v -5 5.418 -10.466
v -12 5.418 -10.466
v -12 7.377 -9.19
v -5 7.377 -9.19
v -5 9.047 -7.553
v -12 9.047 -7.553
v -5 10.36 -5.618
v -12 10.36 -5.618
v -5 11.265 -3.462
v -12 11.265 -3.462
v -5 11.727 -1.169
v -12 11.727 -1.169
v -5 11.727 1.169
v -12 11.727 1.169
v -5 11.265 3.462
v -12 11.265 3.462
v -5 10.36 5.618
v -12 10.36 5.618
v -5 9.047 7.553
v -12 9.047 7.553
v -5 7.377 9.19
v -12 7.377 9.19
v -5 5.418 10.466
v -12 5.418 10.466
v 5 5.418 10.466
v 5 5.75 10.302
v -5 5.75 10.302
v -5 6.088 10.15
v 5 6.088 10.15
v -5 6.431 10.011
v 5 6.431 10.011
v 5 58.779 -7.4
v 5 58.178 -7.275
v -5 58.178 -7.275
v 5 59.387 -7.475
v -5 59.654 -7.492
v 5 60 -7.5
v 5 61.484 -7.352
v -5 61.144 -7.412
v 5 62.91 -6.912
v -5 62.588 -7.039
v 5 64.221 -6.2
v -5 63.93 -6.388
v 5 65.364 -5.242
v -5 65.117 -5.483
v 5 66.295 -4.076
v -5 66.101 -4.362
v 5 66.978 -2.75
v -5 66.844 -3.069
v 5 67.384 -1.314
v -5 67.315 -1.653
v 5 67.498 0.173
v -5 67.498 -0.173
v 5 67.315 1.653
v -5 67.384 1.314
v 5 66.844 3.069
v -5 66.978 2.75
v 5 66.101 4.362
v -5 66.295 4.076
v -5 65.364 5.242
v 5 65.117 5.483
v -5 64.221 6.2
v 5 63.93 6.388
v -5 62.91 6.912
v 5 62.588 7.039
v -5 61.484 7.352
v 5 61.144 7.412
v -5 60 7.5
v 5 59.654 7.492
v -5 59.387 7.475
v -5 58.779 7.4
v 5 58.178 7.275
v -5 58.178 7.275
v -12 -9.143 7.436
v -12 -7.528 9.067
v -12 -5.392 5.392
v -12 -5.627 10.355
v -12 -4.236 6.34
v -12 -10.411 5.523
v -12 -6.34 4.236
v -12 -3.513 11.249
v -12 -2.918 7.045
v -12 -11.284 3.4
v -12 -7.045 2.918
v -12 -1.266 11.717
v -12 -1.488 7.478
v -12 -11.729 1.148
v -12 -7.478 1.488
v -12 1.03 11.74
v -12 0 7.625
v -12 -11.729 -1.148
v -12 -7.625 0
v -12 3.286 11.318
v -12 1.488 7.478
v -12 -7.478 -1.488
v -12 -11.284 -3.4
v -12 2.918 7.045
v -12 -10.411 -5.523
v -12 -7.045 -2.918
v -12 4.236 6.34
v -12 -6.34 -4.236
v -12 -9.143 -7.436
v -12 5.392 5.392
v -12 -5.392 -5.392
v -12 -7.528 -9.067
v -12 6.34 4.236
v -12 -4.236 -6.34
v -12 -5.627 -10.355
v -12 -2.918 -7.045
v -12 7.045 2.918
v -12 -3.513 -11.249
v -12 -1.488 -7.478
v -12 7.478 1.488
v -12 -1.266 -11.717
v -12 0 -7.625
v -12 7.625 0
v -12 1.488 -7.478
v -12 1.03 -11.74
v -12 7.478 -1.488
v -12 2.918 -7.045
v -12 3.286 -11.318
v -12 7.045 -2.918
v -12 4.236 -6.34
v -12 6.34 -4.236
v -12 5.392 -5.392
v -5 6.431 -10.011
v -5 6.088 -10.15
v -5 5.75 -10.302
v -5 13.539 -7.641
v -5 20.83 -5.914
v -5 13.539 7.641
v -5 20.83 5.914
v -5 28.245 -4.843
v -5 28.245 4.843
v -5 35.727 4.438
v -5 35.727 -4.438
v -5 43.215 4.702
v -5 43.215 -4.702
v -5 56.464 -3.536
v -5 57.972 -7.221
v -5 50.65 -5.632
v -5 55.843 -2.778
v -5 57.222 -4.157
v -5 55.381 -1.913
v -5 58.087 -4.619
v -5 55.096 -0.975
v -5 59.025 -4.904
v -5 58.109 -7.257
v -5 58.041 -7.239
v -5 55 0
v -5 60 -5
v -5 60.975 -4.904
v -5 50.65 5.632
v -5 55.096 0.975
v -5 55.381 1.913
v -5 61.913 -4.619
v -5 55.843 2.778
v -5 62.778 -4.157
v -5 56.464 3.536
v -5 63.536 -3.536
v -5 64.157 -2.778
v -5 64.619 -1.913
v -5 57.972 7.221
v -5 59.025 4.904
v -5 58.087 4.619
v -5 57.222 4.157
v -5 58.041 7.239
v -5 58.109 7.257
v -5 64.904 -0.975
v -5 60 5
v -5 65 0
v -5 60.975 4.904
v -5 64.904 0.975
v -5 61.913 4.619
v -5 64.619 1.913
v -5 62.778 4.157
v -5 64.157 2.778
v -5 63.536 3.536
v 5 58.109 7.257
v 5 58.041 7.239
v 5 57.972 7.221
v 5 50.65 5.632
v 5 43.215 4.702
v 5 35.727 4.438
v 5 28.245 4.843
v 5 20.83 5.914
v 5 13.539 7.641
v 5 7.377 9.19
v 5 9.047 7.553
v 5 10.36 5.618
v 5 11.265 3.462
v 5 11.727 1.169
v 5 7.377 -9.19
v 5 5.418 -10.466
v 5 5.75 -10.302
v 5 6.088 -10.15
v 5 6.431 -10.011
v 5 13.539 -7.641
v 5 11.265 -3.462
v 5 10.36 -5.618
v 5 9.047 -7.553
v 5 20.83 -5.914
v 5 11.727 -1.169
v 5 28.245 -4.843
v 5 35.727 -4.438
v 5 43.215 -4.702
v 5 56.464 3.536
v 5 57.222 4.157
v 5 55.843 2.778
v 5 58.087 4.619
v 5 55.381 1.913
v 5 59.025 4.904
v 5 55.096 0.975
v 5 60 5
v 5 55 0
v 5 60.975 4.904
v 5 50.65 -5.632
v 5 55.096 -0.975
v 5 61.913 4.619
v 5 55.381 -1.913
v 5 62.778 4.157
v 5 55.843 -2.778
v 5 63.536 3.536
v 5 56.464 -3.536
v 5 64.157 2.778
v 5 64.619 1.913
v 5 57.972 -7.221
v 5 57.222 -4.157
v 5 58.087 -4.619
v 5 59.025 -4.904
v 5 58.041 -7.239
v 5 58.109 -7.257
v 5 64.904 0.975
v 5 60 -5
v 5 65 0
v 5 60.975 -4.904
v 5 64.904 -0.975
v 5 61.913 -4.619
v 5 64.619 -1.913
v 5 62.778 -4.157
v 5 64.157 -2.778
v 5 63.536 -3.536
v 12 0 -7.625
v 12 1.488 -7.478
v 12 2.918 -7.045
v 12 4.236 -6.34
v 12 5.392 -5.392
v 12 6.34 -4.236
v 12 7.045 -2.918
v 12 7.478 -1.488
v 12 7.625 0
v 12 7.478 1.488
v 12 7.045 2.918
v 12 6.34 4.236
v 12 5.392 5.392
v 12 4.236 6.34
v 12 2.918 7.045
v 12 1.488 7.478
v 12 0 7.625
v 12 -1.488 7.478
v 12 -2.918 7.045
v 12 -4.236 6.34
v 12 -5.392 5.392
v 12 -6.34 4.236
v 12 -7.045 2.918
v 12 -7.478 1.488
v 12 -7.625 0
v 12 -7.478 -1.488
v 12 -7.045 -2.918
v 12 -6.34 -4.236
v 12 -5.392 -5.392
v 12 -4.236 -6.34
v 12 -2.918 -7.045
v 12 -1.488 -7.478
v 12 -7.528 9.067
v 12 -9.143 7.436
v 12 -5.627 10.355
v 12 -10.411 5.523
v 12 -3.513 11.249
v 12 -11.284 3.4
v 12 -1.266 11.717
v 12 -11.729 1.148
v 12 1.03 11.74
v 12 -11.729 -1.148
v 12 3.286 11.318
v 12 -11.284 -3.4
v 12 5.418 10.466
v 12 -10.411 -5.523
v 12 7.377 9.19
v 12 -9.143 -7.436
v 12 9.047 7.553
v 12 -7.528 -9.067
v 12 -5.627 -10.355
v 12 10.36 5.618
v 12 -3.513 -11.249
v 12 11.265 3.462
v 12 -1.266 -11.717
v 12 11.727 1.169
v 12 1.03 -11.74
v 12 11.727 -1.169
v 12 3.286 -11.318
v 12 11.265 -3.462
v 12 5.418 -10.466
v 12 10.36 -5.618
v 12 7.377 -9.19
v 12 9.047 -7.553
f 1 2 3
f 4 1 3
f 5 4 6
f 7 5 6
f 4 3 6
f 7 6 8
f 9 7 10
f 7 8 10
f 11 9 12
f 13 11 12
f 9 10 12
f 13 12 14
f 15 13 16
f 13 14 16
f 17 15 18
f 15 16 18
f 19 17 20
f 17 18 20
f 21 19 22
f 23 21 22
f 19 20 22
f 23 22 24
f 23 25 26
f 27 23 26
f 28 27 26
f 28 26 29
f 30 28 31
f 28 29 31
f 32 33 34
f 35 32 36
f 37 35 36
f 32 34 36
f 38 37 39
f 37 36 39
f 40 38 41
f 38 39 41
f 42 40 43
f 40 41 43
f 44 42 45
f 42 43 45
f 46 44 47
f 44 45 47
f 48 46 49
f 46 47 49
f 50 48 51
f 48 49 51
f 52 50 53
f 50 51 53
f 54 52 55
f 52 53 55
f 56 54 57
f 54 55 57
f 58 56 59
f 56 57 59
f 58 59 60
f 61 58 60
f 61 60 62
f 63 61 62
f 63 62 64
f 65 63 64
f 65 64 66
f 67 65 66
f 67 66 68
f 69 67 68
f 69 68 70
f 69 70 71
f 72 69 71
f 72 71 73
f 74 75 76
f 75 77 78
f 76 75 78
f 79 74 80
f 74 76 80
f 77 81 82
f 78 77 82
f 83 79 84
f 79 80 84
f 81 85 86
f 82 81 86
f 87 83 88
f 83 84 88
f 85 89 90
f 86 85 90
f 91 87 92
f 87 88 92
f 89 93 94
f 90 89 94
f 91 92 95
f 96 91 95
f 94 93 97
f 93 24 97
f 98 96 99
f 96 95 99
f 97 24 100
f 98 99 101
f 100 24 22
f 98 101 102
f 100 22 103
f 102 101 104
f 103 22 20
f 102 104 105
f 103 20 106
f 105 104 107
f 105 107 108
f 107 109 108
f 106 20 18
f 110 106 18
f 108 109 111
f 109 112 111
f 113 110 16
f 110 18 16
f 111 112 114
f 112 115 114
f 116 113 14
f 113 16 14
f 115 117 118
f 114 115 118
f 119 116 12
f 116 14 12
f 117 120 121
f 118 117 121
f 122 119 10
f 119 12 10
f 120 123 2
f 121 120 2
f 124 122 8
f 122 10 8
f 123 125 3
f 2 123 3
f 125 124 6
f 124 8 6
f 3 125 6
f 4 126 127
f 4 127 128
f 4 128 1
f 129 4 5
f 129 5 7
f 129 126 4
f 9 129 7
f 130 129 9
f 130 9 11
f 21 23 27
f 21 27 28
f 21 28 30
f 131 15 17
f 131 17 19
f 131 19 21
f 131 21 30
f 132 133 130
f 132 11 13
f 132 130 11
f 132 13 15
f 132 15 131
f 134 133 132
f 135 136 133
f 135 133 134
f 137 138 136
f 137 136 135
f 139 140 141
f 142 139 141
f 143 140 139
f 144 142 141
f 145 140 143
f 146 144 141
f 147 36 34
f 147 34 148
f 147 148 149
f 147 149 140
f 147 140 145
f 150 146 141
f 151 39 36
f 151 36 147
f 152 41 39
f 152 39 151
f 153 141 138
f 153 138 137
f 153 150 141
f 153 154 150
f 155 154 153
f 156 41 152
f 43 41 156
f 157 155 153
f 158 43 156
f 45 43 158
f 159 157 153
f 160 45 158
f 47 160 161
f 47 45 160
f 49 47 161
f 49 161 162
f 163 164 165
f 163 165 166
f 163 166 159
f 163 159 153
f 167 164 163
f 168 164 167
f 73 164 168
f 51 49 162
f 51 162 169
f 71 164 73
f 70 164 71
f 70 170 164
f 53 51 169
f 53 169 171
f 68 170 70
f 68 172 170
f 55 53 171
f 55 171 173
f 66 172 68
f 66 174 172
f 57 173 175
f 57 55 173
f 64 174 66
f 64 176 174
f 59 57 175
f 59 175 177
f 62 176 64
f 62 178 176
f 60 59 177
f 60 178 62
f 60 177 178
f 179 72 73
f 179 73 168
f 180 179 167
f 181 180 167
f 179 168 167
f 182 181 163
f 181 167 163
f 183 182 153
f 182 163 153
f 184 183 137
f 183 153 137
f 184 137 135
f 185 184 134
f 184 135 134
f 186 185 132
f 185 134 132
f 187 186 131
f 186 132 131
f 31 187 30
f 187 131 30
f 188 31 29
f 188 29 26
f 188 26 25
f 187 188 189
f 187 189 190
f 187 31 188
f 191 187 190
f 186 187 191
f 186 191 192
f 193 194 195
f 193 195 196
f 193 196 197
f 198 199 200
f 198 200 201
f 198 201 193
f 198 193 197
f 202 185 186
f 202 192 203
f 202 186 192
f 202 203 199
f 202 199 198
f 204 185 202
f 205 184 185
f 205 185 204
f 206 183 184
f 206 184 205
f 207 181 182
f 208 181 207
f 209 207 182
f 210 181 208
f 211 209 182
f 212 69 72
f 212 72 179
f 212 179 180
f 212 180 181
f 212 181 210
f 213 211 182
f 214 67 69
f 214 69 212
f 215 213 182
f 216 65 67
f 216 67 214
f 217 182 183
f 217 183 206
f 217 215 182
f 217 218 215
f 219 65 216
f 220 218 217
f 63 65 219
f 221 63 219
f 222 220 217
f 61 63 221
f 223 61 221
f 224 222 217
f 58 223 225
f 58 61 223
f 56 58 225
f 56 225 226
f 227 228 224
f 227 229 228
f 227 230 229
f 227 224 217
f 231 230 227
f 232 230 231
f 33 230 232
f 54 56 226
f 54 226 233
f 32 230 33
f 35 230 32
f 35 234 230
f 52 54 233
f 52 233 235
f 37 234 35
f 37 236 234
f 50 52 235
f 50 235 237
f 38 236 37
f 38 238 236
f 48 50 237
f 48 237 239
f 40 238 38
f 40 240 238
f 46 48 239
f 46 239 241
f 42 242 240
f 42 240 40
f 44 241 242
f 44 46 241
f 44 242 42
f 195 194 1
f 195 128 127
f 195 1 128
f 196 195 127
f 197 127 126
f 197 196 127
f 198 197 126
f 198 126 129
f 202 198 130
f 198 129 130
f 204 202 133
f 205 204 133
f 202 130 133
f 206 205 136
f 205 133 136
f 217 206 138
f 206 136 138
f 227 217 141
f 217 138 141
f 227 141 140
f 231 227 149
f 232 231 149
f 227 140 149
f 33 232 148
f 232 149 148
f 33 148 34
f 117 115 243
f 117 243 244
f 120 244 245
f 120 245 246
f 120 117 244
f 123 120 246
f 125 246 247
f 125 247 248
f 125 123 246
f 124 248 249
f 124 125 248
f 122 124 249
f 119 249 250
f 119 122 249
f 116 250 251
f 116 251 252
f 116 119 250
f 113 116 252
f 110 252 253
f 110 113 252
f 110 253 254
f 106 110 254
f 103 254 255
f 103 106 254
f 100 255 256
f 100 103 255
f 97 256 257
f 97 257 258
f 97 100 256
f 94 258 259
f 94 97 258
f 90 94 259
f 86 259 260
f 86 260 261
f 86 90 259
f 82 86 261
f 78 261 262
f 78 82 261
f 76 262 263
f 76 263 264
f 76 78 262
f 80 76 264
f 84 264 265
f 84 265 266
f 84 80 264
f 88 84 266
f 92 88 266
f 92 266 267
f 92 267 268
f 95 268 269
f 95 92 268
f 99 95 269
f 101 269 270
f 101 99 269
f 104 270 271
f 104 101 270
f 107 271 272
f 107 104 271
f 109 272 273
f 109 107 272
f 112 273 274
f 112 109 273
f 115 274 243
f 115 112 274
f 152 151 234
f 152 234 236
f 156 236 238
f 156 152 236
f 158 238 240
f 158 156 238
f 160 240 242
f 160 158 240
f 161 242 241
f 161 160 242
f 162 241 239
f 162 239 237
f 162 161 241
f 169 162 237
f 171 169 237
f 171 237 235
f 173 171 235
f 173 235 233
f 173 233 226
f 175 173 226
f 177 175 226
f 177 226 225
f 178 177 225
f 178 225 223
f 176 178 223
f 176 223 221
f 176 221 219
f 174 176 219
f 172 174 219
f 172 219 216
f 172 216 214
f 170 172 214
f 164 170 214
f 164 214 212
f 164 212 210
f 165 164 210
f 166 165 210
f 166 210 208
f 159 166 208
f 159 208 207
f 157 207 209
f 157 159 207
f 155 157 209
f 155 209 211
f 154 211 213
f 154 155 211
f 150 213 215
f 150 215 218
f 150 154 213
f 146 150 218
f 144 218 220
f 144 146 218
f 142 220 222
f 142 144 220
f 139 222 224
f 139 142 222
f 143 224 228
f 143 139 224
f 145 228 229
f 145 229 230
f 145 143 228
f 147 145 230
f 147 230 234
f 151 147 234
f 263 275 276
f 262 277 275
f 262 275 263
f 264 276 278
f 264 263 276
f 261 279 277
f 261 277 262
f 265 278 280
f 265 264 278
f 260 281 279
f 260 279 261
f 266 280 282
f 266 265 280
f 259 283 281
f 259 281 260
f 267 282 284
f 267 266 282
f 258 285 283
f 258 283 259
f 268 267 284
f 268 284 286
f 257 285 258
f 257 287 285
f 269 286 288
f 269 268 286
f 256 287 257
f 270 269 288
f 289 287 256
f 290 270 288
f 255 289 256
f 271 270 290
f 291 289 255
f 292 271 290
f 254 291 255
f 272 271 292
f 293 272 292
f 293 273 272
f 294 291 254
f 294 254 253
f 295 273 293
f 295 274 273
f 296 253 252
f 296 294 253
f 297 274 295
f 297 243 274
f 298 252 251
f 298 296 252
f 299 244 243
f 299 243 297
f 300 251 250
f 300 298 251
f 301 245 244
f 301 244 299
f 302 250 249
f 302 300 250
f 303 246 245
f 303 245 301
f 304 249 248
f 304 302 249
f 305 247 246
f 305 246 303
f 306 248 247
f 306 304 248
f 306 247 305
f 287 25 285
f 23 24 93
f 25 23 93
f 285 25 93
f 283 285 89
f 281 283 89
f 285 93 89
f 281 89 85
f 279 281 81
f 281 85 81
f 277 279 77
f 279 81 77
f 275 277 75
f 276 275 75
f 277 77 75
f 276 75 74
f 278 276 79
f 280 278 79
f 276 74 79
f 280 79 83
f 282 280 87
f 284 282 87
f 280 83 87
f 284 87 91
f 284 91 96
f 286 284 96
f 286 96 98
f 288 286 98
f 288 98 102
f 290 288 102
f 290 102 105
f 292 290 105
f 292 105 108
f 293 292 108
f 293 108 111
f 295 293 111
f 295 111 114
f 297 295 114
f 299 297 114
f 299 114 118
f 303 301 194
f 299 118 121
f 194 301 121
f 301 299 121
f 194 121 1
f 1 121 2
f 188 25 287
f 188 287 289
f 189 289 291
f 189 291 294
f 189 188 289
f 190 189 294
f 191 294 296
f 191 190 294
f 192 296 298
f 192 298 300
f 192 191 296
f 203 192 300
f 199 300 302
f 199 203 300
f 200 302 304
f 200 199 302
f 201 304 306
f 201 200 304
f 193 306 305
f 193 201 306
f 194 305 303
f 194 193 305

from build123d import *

# Parameters (mm, degrees)
BOSS_EXTRUDE2_DEPTH      = 12
BOSS_EXTRUDE2_DEPTH_BACK = 12
SKETCH1_R                = 7.625
SKETCH1_R_2              = 5
FILLET1_R                = 10
CUT_EXTRUDE1_START       = -7
SKETCH2_R                = 5
CUT_EXTRUDE1_DEPTH       = 7
SKETCH3_R                = 5
CUT_EXTRUDE2_DEPTH       = 7


with BuildPart() as part:
    # Sketch1 → Boss-Extrude2 (new, two sides: drawn at the far end of the back side and taken through both)
    with BuildSketch(Plane(origin=(0, 0, 0), x_dir=(0, 0, -1), z_dir=(1, 0, 0)).offset(-BOSS_EXTRUDE2_DEPTH_BACK)):
        with BuildLine():
            ThreePointArc((10.249331942, 5.817161927), (4.569540082, 31.759611334), (7.275406493, 58.178335825))
            ThreePointArc((7.275406493, 58.178335825), (0, 67.5), (-7.275406493, 58.178335825))
            ThreePointArc((-7.275406493, 58.178335825), (-4.569540082, 31.759611334), (-10.249331942, 5.817161927))
            ThreePointArc((-10.249331942, 5.817161927), (0, -11.785082866), (10.249331942, 5.817161927))
        make_face()
        Circle(SKETCH1_R, mode=Mode.SUBTRACT)
        with Locations((0, 60)):
            Circle(SKETCH1_R_2, mode=Mode.SUBTRACT)
    extrude(amount=BOSS_EXTRUDE2_DEPTH + BOSS_EXTRUDE2_DEPTH_BACK)

    # Fillet1
    fillet1_edges = [part.edges().sort_by_distance(p)[0] for p in [
        (0, 5.817161927, -10.249331942),
        (0, 5.817161927, 10.249331942),
    ]]
    fillet(fillet1_edges, radius=FILLET1_R)

    # Sketch2 → Cut-Extrude1 (cut)
    with BuildSketch(Plane(origin=(12, 0, 0), x_dir=(0, 0, -1), z_dir=(1, 0, 0)).offset(CUT_EXTRUDE1_START)):
        with BuildLine():
            ThreePointArc((7.275406493, 58.178335825), (0, 67.5), (-7.275406493, 58.178335825))
            ThreePointArc((-7.275406493, 58.178335825), (-4.551513528, 32.088385289), (-10.010939305, 6.431031917))
            ThreePointArc((-10.010939305, 6.431031917), (-10.224413054, 5.917964178), (-10.466057682, 5.417546931))
            ThreePointArc((-10.466057682, 5.417546931), (0, 11.785082866), (10.466057682, 5.417546931))
            ThreePointArc((10.466057682, 5.417546931), (10.224413054, 5.917964178), (10.010939305, 6.431031917))
            ThreePointArc((10.010939305, 6.431031917), (4.551513528, 32.088385289), (7.275406493, 58.178335825))
        make_face()
        with Locations((0, 60)):
            Circle(SKETCH2_R, mode=Mode.SUBTRACT)
    extrude(amount=CUT_EXTRUDE1_DEPTH, mode=Mode.SUBTRACT)

    # Sketch3 → Cut-Extrude2 (cut)
    with BuildSketch(Plane.ZY.offset(12)):
        with BuildLine():
            ThreePointArc((7.275406493, 58.178335825), (0, 67.5), (-7.275406493, 58.178335825))
            ThreePointArc((-7.275406493, 58.178335825), (-4.551513528, 32.088385289), (-10.010939305, 6.431031917))
            ThreePointArc((-10.010939305, 6.431031917), (-10.224413054, 5.917964178), (-10.466057682, 5.417546931))
            ThreePointArc((-10.466057682, 5.417546931), (0, 11.785082866), (10.466057682, 5.417546931))
            ThreePointArc((10.466057682, 5.417546931), (10.224413054, 5.917964178), (10.010939305, 6.431031917))
            ThreePointArc((10.010939305, 6.431031917), (4.551513528, 32.088385289), (7.275406493, 58.178335825))
        make_face()
        with Locations((0, 60)):
            Circle(SKETCH3_R, mode=Mode.SUBTRACT)
    extrude(amount=-CUT_EXTRUDE2_DEPTH, mode=Mode.SUBTRACT)


solid = part.part
